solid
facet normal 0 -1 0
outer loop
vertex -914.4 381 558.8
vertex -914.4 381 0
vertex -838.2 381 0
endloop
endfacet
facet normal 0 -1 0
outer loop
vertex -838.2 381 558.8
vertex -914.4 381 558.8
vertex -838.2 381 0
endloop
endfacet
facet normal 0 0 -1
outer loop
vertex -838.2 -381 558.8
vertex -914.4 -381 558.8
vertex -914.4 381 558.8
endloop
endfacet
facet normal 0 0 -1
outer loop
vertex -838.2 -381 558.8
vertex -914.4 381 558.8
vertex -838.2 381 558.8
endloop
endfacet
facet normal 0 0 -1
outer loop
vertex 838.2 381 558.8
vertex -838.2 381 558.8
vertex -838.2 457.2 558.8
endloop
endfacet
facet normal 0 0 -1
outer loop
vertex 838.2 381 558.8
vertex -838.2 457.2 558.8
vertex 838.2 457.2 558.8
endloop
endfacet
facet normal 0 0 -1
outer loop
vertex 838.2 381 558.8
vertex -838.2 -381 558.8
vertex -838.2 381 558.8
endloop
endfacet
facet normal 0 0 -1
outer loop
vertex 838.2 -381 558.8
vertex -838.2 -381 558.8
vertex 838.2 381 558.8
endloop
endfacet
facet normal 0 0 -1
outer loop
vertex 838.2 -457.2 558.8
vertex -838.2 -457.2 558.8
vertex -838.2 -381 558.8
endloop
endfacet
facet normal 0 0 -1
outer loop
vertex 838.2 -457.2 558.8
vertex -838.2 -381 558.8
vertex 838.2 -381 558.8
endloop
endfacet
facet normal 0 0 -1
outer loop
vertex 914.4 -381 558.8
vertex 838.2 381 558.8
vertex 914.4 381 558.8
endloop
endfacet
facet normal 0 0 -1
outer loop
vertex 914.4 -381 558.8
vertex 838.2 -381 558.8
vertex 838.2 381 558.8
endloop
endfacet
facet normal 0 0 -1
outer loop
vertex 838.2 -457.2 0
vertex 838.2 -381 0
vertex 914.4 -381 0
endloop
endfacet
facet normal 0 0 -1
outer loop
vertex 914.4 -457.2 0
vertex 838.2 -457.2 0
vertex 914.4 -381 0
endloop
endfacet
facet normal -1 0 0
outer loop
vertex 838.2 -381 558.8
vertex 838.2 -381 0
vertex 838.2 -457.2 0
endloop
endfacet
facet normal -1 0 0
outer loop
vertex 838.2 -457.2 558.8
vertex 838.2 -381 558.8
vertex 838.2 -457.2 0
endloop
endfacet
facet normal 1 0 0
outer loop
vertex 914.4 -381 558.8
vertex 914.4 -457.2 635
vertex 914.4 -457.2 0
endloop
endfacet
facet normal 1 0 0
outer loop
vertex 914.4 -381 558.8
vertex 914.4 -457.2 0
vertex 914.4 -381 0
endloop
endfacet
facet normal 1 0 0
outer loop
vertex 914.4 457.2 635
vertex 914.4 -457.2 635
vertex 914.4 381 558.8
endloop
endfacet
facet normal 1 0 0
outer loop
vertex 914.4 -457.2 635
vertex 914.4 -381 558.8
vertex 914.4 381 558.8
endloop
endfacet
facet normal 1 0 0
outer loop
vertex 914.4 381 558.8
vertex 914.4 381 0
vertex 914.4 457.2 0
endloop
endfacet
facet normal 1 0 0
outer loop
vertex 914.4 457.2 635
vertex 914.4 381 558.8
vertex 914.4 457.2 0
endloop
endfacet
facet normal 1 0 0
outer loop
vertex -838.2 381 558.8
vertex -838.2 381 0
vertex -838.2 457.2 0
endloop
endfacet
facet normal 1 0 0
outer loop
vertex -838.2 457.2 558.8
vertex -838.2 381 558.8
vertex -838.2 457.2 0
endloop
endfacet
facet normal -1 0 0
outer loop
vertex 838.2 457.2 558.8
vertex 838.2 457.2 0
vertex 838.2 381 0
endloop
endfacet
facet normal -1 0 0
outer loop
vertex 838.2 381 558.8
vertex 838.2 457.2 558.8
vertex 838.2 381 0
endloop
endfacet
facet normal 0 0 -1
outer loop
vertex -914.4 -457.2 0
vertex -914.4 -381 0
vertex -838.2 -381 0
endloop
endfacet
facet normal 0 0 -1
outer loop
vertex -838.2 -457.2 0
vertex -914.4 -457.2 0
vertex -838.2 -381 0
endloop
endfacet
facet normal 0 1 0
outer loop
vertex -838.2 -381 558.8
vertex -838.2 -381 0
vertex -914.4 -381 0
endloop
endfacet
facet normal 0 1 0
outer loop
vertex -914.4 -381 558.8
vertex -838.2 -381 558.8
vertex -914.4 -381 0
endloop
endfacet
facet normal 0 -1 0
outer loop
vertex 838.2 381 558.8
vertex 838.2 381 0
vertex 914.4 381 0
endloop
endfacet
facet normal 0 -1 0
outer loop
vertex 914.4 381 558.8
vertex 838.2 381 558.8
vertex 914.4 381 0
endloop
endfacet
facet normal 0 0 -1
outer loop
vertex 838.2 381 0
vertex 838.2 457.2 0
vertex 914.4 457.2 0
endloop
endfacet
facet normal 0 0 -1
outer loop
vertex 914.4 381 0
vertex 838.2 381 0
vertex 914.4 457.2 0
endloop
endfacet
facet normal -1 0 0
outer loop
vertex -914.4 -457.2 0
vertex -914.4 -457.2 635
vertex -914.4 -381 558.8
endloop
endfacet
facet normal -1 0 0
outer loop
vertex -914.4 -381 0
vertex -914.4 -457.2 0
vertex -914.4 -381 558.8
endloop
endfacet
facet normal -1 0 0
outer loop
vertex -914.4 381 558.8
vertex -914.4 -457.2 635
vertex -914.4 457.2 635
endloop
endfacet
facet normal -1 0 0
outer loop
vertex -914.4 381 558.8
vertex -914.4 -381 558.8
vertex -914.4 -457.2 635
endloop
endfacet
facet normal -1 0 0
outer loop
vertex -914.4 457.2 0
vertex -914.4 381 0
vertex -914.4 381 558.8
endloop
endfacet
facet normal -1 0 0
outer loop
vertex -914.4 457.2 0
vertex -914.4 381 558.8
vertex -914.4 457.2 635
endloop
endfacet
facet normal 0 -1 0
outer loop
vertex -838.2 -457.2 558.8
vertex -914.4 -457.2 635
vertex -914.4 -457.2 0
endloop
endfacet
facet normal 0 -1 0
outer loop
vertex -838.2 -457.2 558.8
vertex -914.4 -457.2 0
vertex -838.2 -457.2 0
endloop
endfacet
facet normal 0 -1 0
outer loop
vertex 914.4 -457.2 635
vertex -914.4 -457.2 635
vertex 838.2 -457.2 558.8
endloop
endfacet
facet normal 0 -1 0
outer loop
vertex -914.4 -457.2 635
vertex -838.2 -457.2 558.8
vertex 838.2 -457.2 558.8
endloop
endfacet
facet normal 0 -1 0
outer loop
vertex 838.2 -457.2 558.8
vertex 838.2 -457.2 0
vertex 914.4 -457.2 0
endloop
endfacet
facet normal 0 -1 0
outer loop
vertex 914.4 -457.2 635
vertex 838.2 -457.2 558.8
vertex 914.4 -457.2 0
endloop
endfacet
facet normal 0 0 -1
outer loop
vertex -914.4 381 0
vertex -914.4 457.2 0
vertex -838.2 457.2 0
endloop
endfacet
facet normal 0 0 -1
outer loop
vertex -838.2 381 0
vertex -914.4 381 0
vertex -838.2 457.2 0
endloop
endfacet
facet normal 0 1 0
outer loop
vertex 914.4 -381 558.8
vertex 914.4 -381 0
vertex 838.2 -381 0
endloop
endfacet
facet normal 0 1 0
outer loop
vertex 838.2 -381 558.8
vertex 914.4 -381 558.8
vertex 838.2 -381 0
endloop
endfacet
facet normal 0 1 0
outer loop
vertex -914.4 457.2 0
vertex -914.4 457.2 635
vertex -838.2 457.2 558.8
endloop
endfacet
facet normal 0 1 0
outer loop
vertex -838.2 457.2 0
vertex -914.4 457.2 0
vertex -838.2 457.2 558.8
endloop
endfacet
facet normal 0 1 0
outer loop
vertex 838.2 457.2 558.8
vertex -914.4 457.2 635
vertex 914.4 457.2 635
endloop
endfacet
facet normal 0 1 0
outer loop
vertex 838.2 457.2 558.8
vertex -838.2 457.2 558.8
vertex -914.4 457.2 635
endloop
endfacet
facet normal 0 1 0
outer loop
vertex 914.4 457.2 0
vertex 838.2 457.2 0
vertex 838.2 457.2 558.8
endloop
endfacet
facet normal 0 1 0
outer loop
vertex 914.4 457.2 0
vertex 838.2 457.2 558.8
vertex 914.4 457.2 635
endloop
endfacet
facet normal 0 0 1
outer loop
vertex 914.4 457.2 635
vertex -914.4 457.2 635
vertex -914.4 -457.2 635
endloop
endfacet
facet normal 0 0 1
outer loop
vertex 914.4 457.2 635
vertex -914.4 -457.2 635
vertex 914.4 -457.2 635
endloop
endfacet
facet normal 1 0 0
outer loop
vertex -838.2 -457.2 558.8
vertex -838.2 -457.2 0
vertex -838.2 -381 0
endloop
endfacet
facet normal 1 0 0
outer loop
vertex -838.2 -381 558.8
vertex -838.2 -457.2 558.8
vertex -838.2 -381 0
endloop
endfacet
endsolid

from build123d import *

# Parameters (mm, degrees)
F0_W     = 1828.8
F0_H     = 914.4
F1_DEPTH = 635
F3_DEPTH = 558.8


with BuildPart() as f1:
    # F0 (on Top) → F1 (new body)
    with BuildSketch(Plane.XY):
        Rectangle(F0_W, F0_H)
    extrude(amount=F1_DEPTH)

    # F2 (on face) → F3 (cut)
    with BuildSketch(Plane(origin=(0, 0, 0), x_dir=(1, 0, 0), z_dir=(0, 0, -1))):
        Polygon((838.2, 457.2), (-838.2, 457.2), (-838.2, 381), (-914.4, 381), (-914.4, -381), (-838.2, -381), (-838.2, -457.2), (838.2, -457.2), (838.2, -381), (914.4, -381), (914.4, 381), (838.2, 381), align=None)
    extrude(amount=-F3_DEPTH, mode=Mode.SUBTRACT)


solid = f1.part
